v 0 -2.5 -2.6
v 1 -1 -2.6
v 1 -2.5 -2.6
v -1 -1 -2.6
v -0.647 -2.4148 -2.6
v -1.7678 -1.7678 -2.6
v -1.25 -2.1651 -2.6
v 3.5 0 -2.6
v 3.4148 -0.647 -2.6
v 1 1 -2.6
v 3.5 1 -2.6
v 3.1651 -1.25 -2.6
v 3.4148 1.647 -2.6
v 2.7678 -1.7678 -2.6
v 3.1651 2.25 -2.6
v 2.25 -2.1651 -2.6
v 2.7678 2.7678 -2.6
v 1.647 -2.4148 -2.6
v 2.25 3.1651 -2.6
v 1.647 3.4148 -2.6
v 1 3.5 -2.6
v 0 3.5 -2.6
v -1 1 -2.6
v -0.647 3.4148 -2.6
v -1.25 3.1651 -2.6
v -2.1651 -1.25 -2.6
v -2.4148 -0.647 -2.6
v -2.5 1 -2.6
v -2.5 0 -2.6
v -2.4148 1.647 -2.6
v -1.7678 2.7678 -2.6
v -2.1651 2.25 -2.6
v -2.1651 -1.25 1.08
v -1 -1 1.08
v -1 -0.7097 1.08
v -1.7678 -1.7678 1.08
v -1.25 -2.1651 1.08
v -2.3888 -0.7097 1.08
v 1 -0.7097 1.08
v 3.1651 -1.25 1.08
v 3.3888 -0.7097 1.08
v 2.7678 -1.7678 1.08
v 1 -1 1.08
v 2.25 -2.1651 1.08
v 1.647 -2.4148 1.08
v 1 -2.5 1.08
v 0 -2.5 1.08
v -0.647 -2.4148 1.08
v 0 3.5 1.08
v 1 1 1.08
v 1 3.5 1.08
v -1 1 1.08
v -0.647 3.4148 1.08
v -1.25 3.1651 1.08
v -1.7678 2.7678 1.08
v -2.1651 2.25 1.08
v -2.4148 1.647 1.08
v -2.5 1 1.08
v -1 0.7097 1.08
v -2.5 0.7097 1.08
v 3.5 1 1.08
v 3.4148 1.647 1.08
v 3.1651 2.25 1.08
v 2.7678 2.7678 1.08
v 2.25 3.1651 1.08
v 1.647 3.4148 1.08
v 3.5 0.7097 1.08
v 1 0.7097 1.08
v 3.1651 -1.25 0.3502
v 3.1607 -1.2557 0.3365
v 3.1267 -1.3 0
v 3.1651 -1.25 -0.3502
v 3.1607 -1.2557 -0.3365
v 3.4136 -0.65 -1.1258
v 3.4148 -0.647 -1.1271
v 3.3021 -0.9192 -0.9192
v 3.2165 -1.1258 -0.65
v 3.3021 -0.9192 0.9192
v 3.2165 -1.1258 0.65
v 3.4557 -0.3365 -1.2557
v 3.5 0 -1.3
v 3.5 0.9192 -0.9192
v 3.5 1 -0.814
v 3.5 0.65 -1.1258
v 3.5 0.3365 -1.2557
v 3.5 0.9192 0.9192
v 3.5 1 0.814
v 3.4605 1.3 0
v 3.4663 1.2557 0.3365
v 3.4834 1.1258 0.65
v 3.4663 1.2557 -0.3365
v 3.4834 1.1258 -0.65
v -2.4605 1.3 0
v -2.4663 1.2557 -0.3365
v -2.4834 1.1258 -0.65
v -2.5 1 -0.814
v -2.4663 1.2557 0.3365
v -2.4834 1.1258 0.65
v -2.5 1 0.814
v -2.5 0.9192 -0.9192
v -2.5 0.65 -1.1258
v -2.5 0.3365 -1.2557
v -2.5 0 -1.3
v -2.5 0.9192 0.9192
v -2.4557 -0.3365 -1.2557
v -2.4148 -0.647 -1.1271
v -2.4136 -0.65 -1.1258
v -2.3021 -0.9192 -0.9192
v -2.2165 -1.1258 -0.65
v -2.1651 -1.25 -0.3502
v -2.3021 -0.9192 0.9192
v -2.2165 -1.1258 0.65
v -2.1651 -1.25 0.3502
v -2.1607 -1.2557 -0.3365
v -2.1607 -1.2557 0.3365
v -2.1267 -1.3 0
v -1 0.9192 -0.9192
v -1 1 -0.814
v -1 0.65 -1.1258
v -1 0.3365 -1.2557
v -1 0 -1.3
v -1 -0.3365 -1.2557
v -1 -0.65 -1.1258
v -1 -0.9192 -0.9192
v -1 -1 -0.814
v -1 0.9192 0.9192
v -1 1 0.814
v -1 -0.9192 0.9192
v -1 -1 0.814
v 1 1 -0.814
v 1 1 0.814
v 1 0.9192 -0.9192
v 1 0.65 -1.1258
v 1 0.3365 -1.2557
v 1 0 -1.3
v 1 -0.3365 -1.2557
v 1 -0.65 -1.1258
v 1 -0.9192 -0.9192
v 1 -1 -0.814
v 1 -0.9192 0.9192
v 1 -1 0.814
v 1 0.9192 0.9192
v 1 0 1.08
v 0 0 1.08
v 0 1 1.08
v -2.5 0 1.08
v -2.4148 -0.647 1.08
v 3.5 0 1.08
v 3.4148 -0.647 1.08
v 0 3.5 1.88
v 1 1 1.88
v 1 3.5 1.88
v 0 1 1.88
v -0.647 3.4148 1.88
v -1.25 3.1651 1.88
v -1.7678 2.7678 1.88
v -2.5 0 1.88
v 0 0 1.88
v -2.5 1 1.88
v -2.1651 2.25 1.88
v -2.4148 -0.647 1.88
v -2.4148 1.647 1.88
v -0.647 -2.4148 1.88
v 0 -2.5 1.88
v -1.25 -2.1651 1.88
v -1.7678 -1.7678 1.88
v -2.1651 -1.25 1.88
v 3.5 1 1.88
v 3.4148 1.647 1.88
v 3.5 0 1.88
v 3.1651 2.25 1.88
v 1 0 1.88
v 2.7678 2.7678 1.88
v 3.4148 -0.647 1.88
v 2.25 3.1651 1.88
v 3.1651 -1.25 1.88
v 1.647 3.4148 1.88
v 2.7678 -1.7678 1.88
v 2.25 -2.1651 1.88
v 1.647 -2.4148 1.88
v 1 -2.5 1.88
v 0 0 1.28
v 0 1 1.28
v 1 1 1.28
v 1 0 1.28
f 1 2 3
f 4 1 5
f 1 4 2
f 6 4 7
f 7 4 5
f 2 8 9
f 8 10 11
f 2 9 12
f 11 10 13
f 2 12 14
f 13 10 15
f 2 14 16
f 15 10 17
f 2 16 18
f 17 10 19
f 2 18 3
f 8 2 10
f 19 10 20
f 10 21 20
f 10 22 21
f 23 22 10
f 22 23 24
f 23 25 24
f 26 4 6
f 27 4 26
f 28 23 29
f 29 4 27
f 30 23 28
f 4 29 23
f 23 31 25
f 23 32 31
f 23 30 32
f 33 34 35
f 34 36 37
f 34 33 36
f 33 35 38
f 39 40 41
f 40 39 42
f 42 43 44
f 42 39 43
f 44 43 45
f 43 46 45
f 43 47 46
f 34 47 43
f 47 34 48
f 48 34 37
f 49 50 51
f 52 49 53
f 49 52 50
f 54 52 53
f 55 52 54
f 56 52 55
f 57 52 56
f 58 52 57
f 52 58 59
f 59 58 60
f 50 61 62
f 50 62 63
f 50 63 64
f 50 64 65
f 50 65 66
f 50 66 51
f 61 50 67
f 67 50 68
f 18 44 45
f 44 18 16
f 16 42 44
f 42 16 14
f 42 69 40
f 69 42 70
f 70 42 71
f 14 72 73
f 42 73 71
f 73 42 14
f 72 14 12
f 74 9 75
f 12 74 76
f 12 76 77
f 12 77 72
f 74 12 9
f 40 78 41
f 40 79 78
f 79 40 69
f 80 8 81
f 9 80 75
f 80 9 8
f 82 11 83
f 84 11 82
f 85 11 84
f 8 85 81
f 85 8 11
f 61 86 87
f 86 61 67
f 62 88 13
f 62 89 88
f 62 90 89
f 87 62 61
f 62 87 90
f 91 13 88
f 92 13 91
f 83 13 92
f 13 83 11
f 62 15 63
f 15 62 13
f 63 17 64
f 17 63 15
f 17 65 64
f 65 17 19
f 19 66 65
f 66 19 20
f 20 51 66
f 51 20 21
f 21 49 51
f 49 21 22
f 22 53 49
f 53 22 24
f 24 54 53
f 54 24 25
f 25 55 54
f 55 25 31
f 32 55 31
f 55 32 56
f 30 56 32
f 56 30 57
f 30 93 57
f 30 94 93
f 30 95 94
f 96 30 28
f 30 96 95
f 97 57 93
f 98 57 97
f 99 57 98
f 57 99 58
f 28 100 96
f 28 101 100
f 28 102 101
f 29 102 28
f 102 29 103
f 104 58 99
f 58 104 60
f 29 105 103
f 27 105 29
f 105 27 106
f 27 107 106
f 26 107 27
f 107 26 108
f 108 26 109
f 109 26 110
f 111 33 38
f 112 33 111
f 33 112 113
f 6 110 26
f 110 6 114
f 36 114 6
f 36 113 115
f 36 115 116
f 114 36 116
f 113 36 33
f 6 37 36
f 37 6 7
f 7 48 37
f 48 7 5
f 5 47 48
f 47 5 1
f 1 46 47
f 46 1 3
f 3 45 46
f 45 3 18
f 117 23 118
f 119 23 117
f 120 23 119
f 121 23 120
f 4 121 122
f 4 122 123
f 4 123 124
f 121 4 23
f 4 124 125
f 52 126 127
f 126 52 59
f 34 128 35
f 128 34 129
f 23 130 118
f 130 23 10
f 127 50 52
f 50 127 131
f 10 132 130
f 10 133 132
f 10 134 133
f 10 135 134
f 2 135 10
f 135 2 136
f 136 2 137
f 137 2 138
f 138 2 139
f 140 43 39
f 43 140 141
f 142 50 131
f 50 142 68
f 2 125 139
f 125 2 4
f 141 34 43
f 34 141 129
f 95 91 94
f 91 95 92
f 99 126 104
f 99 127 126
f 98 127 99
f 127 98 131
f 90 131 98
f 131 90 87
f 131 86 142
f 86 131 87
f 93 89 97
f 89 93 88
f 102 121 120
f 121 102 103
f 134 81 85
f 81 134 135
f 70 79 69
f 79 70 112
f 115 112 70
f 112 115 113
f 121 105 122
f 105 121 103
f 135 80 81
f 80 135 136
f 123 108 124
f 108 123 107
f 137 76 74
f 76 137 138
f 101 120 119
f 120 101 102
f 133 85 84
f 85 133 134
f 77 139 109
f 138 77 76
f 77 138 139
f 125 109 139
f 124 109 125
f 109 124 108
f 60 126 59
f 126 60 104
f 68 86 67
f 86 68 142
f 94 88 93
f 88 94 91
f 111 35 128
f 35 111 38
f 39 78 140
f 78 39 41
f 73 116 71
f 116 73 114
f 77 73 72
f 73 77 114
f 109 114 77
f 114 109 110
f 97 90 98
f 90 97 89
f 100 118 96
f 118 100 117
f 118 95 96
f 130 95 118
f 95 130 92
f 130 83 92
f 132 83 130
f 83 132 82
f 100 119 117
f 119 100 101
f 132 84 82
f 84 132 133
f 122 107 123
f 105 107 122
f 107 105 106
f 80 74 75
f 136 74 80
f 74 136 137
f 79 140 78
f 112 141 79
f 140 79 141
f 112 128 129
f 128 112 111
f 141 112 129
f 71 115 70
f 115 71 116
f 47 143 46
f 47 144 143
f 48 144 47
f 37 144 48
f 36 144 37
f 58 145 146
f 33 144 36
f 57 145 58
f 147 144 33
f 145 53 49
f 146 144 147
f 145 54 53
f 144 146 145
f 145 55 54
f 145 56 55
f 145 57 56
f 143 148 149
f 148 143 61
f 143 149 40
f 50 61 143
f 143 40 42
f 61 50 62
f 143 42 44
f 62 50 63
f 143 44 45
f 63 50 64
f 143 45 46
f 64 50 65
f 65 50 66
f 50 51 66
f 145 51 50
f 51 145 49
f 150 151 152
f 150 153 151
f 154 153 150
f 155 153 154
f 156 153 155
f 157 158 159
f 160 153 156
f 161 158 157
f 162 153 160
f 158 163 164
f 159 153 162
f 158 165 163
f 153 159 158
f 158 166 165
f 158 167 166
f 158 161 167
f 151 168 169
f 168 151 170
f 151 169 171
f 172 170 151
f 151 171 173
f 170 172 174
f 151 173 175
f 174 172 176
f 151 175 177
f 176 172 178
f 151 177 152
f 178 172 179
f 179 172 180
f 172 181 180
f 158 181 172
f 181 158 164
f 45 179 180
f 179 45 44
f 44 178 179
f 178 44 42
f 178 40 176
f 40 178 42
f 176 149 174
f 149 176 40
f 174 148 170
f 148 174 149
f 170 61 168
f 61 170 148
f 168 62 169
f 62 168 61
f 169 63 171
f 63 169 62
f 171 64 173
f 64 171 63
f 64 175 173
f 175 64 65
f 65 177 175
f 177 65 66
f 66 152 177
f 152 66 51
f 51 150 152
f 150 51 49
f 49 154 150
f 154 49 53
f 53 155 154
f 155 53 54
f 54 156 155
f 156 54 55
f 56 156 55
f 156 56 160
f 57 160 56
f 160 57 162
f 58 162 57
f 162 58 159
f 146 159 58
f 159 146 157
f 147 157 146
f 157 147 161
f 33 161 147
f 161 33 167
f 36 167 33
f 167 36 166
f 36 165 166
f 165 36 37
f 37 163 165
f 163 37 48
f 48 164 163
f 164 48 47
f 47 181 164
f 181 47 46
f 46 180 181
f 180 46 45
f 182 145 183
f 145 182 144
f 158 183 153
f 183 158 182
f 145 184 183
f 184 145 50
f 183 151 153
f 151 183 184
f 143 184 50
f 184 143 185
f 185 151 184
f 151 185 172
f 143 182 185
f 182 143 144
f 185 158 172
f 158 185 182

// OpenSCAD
$fn = 24;

//include<UB.scad>;


// Padding for cushioning/air aroudn screen
TFTpadding = 0.5;

// Border overlap left-Top-Right-Bottom
TFTborder = [5.25, 4.6, 5.25, 9.11];

// Outer TFT panel dimensions + measurement error
TFTsize = [125.4, 99.7, 1.08];
TFTpos = [0,TFTborder.w - TFTborder.y,0];

// window x, y, width, height
TFTwindow = [TFTborder.x, TFTborder.y
    , TFTsize.x-TFTborder.x-TFTborder.z
    , TFTsize.y-TFTborder.y-TFTborder.w];
TFTwindowSize = TFTsize.xy - TFTborder.xy - TFTborder.zw;

// Frame wall width 
WALLwidth = 2.0;
WALLheight = 2.6;

//Frame front
FRONTdepth = 0.8;

// Bevel width in window opening
FRONTwindowBevel = 10;
// Bevel minimum thickness at window opening
FRONTwindowOffset = 0.2;

// TFT flex ribbon exit
TFTribbonWidth = 23.5;
//TFTribbonX = (TFTsize.x - TFTribbonWidth) /2;
TFTribbonPos = TFTpos + [0, TFTsize.y/2, -TFTsize.z];
TFTribbonPadding = 1.0;
TFTribbonBendRadius = 1.3;

// TFT connector
TFTconnectorWidth = 12.6;
TFTconnectorPos = 55.47;

module TFT()
 {  
 color([1, 0, 1] )
   translate(TFTpos)
   linear_extrude(TFTsize.z)
         square( TFTsize.xy, true ); 
 };
 //TFT();
 
 module TFTribbon()
 {
 translate( TFTribbonPos )
     rotate( [0,90,0] )
        cylinder( h = TFTribbonWidth+TFTribbonPadding*2, r = TFTribbonBendRadius, center=true);
 }
 //TFTribbon();
 
module windowOutline()
 {  
 translate( TFTpos )
    translate(-TFTsize.xy/2 + TFTborder.xy)
         square( TFTwindowSize, false ); 
 };

module frontFrameOutline() 
{
translate( -TFTsize.xy/2)
    offset(WALLwidth + TFTpadding) 
         square( TFTsize.xy + TFTpos, false ); 
}
         
         
 module wallOutline()
 {
    difference()
    {
         frontFrameOutline();
         translate(TFTpos) 
            offset(delta=TFTpadding) square( TFTsize.xy, true ); 
    }
 }
 
 module windowCutout()
 {
    scalet = [1,1] + [FRONTwindowBevel/TFTwindowSize.x
                     ,FRONTwindowBevel/TFTwindowSize.y];
  
  translate([0,0,FRONTwindowOffset])
   linear_extrude( height = FRONTdepth+0.01, scale = scalet )  windowOutline();

 }
 // windowCutout();

  
 module walls()
 {
     difference()
     {
        translate( [0,0,-WALLheight] )
            linear_extrude(WALLheight+TFTsize.z) wallOutline();
            
        TFTribbon();
     }
 }
 
 module frontFrame()
 {
    translate( [0,0,TFTsize.z] )
      difference()
      {
         linear_extrude( FRONTdepth ) 
           difference()
             {
                frontFrameOutline();
                windowOutline();
            }
        windowCutout();
    }
 }
 
// TFT();
//TFTribbon();

module it()
{
  union(){
    walls();
    frontFrame();
  }
}
it();
